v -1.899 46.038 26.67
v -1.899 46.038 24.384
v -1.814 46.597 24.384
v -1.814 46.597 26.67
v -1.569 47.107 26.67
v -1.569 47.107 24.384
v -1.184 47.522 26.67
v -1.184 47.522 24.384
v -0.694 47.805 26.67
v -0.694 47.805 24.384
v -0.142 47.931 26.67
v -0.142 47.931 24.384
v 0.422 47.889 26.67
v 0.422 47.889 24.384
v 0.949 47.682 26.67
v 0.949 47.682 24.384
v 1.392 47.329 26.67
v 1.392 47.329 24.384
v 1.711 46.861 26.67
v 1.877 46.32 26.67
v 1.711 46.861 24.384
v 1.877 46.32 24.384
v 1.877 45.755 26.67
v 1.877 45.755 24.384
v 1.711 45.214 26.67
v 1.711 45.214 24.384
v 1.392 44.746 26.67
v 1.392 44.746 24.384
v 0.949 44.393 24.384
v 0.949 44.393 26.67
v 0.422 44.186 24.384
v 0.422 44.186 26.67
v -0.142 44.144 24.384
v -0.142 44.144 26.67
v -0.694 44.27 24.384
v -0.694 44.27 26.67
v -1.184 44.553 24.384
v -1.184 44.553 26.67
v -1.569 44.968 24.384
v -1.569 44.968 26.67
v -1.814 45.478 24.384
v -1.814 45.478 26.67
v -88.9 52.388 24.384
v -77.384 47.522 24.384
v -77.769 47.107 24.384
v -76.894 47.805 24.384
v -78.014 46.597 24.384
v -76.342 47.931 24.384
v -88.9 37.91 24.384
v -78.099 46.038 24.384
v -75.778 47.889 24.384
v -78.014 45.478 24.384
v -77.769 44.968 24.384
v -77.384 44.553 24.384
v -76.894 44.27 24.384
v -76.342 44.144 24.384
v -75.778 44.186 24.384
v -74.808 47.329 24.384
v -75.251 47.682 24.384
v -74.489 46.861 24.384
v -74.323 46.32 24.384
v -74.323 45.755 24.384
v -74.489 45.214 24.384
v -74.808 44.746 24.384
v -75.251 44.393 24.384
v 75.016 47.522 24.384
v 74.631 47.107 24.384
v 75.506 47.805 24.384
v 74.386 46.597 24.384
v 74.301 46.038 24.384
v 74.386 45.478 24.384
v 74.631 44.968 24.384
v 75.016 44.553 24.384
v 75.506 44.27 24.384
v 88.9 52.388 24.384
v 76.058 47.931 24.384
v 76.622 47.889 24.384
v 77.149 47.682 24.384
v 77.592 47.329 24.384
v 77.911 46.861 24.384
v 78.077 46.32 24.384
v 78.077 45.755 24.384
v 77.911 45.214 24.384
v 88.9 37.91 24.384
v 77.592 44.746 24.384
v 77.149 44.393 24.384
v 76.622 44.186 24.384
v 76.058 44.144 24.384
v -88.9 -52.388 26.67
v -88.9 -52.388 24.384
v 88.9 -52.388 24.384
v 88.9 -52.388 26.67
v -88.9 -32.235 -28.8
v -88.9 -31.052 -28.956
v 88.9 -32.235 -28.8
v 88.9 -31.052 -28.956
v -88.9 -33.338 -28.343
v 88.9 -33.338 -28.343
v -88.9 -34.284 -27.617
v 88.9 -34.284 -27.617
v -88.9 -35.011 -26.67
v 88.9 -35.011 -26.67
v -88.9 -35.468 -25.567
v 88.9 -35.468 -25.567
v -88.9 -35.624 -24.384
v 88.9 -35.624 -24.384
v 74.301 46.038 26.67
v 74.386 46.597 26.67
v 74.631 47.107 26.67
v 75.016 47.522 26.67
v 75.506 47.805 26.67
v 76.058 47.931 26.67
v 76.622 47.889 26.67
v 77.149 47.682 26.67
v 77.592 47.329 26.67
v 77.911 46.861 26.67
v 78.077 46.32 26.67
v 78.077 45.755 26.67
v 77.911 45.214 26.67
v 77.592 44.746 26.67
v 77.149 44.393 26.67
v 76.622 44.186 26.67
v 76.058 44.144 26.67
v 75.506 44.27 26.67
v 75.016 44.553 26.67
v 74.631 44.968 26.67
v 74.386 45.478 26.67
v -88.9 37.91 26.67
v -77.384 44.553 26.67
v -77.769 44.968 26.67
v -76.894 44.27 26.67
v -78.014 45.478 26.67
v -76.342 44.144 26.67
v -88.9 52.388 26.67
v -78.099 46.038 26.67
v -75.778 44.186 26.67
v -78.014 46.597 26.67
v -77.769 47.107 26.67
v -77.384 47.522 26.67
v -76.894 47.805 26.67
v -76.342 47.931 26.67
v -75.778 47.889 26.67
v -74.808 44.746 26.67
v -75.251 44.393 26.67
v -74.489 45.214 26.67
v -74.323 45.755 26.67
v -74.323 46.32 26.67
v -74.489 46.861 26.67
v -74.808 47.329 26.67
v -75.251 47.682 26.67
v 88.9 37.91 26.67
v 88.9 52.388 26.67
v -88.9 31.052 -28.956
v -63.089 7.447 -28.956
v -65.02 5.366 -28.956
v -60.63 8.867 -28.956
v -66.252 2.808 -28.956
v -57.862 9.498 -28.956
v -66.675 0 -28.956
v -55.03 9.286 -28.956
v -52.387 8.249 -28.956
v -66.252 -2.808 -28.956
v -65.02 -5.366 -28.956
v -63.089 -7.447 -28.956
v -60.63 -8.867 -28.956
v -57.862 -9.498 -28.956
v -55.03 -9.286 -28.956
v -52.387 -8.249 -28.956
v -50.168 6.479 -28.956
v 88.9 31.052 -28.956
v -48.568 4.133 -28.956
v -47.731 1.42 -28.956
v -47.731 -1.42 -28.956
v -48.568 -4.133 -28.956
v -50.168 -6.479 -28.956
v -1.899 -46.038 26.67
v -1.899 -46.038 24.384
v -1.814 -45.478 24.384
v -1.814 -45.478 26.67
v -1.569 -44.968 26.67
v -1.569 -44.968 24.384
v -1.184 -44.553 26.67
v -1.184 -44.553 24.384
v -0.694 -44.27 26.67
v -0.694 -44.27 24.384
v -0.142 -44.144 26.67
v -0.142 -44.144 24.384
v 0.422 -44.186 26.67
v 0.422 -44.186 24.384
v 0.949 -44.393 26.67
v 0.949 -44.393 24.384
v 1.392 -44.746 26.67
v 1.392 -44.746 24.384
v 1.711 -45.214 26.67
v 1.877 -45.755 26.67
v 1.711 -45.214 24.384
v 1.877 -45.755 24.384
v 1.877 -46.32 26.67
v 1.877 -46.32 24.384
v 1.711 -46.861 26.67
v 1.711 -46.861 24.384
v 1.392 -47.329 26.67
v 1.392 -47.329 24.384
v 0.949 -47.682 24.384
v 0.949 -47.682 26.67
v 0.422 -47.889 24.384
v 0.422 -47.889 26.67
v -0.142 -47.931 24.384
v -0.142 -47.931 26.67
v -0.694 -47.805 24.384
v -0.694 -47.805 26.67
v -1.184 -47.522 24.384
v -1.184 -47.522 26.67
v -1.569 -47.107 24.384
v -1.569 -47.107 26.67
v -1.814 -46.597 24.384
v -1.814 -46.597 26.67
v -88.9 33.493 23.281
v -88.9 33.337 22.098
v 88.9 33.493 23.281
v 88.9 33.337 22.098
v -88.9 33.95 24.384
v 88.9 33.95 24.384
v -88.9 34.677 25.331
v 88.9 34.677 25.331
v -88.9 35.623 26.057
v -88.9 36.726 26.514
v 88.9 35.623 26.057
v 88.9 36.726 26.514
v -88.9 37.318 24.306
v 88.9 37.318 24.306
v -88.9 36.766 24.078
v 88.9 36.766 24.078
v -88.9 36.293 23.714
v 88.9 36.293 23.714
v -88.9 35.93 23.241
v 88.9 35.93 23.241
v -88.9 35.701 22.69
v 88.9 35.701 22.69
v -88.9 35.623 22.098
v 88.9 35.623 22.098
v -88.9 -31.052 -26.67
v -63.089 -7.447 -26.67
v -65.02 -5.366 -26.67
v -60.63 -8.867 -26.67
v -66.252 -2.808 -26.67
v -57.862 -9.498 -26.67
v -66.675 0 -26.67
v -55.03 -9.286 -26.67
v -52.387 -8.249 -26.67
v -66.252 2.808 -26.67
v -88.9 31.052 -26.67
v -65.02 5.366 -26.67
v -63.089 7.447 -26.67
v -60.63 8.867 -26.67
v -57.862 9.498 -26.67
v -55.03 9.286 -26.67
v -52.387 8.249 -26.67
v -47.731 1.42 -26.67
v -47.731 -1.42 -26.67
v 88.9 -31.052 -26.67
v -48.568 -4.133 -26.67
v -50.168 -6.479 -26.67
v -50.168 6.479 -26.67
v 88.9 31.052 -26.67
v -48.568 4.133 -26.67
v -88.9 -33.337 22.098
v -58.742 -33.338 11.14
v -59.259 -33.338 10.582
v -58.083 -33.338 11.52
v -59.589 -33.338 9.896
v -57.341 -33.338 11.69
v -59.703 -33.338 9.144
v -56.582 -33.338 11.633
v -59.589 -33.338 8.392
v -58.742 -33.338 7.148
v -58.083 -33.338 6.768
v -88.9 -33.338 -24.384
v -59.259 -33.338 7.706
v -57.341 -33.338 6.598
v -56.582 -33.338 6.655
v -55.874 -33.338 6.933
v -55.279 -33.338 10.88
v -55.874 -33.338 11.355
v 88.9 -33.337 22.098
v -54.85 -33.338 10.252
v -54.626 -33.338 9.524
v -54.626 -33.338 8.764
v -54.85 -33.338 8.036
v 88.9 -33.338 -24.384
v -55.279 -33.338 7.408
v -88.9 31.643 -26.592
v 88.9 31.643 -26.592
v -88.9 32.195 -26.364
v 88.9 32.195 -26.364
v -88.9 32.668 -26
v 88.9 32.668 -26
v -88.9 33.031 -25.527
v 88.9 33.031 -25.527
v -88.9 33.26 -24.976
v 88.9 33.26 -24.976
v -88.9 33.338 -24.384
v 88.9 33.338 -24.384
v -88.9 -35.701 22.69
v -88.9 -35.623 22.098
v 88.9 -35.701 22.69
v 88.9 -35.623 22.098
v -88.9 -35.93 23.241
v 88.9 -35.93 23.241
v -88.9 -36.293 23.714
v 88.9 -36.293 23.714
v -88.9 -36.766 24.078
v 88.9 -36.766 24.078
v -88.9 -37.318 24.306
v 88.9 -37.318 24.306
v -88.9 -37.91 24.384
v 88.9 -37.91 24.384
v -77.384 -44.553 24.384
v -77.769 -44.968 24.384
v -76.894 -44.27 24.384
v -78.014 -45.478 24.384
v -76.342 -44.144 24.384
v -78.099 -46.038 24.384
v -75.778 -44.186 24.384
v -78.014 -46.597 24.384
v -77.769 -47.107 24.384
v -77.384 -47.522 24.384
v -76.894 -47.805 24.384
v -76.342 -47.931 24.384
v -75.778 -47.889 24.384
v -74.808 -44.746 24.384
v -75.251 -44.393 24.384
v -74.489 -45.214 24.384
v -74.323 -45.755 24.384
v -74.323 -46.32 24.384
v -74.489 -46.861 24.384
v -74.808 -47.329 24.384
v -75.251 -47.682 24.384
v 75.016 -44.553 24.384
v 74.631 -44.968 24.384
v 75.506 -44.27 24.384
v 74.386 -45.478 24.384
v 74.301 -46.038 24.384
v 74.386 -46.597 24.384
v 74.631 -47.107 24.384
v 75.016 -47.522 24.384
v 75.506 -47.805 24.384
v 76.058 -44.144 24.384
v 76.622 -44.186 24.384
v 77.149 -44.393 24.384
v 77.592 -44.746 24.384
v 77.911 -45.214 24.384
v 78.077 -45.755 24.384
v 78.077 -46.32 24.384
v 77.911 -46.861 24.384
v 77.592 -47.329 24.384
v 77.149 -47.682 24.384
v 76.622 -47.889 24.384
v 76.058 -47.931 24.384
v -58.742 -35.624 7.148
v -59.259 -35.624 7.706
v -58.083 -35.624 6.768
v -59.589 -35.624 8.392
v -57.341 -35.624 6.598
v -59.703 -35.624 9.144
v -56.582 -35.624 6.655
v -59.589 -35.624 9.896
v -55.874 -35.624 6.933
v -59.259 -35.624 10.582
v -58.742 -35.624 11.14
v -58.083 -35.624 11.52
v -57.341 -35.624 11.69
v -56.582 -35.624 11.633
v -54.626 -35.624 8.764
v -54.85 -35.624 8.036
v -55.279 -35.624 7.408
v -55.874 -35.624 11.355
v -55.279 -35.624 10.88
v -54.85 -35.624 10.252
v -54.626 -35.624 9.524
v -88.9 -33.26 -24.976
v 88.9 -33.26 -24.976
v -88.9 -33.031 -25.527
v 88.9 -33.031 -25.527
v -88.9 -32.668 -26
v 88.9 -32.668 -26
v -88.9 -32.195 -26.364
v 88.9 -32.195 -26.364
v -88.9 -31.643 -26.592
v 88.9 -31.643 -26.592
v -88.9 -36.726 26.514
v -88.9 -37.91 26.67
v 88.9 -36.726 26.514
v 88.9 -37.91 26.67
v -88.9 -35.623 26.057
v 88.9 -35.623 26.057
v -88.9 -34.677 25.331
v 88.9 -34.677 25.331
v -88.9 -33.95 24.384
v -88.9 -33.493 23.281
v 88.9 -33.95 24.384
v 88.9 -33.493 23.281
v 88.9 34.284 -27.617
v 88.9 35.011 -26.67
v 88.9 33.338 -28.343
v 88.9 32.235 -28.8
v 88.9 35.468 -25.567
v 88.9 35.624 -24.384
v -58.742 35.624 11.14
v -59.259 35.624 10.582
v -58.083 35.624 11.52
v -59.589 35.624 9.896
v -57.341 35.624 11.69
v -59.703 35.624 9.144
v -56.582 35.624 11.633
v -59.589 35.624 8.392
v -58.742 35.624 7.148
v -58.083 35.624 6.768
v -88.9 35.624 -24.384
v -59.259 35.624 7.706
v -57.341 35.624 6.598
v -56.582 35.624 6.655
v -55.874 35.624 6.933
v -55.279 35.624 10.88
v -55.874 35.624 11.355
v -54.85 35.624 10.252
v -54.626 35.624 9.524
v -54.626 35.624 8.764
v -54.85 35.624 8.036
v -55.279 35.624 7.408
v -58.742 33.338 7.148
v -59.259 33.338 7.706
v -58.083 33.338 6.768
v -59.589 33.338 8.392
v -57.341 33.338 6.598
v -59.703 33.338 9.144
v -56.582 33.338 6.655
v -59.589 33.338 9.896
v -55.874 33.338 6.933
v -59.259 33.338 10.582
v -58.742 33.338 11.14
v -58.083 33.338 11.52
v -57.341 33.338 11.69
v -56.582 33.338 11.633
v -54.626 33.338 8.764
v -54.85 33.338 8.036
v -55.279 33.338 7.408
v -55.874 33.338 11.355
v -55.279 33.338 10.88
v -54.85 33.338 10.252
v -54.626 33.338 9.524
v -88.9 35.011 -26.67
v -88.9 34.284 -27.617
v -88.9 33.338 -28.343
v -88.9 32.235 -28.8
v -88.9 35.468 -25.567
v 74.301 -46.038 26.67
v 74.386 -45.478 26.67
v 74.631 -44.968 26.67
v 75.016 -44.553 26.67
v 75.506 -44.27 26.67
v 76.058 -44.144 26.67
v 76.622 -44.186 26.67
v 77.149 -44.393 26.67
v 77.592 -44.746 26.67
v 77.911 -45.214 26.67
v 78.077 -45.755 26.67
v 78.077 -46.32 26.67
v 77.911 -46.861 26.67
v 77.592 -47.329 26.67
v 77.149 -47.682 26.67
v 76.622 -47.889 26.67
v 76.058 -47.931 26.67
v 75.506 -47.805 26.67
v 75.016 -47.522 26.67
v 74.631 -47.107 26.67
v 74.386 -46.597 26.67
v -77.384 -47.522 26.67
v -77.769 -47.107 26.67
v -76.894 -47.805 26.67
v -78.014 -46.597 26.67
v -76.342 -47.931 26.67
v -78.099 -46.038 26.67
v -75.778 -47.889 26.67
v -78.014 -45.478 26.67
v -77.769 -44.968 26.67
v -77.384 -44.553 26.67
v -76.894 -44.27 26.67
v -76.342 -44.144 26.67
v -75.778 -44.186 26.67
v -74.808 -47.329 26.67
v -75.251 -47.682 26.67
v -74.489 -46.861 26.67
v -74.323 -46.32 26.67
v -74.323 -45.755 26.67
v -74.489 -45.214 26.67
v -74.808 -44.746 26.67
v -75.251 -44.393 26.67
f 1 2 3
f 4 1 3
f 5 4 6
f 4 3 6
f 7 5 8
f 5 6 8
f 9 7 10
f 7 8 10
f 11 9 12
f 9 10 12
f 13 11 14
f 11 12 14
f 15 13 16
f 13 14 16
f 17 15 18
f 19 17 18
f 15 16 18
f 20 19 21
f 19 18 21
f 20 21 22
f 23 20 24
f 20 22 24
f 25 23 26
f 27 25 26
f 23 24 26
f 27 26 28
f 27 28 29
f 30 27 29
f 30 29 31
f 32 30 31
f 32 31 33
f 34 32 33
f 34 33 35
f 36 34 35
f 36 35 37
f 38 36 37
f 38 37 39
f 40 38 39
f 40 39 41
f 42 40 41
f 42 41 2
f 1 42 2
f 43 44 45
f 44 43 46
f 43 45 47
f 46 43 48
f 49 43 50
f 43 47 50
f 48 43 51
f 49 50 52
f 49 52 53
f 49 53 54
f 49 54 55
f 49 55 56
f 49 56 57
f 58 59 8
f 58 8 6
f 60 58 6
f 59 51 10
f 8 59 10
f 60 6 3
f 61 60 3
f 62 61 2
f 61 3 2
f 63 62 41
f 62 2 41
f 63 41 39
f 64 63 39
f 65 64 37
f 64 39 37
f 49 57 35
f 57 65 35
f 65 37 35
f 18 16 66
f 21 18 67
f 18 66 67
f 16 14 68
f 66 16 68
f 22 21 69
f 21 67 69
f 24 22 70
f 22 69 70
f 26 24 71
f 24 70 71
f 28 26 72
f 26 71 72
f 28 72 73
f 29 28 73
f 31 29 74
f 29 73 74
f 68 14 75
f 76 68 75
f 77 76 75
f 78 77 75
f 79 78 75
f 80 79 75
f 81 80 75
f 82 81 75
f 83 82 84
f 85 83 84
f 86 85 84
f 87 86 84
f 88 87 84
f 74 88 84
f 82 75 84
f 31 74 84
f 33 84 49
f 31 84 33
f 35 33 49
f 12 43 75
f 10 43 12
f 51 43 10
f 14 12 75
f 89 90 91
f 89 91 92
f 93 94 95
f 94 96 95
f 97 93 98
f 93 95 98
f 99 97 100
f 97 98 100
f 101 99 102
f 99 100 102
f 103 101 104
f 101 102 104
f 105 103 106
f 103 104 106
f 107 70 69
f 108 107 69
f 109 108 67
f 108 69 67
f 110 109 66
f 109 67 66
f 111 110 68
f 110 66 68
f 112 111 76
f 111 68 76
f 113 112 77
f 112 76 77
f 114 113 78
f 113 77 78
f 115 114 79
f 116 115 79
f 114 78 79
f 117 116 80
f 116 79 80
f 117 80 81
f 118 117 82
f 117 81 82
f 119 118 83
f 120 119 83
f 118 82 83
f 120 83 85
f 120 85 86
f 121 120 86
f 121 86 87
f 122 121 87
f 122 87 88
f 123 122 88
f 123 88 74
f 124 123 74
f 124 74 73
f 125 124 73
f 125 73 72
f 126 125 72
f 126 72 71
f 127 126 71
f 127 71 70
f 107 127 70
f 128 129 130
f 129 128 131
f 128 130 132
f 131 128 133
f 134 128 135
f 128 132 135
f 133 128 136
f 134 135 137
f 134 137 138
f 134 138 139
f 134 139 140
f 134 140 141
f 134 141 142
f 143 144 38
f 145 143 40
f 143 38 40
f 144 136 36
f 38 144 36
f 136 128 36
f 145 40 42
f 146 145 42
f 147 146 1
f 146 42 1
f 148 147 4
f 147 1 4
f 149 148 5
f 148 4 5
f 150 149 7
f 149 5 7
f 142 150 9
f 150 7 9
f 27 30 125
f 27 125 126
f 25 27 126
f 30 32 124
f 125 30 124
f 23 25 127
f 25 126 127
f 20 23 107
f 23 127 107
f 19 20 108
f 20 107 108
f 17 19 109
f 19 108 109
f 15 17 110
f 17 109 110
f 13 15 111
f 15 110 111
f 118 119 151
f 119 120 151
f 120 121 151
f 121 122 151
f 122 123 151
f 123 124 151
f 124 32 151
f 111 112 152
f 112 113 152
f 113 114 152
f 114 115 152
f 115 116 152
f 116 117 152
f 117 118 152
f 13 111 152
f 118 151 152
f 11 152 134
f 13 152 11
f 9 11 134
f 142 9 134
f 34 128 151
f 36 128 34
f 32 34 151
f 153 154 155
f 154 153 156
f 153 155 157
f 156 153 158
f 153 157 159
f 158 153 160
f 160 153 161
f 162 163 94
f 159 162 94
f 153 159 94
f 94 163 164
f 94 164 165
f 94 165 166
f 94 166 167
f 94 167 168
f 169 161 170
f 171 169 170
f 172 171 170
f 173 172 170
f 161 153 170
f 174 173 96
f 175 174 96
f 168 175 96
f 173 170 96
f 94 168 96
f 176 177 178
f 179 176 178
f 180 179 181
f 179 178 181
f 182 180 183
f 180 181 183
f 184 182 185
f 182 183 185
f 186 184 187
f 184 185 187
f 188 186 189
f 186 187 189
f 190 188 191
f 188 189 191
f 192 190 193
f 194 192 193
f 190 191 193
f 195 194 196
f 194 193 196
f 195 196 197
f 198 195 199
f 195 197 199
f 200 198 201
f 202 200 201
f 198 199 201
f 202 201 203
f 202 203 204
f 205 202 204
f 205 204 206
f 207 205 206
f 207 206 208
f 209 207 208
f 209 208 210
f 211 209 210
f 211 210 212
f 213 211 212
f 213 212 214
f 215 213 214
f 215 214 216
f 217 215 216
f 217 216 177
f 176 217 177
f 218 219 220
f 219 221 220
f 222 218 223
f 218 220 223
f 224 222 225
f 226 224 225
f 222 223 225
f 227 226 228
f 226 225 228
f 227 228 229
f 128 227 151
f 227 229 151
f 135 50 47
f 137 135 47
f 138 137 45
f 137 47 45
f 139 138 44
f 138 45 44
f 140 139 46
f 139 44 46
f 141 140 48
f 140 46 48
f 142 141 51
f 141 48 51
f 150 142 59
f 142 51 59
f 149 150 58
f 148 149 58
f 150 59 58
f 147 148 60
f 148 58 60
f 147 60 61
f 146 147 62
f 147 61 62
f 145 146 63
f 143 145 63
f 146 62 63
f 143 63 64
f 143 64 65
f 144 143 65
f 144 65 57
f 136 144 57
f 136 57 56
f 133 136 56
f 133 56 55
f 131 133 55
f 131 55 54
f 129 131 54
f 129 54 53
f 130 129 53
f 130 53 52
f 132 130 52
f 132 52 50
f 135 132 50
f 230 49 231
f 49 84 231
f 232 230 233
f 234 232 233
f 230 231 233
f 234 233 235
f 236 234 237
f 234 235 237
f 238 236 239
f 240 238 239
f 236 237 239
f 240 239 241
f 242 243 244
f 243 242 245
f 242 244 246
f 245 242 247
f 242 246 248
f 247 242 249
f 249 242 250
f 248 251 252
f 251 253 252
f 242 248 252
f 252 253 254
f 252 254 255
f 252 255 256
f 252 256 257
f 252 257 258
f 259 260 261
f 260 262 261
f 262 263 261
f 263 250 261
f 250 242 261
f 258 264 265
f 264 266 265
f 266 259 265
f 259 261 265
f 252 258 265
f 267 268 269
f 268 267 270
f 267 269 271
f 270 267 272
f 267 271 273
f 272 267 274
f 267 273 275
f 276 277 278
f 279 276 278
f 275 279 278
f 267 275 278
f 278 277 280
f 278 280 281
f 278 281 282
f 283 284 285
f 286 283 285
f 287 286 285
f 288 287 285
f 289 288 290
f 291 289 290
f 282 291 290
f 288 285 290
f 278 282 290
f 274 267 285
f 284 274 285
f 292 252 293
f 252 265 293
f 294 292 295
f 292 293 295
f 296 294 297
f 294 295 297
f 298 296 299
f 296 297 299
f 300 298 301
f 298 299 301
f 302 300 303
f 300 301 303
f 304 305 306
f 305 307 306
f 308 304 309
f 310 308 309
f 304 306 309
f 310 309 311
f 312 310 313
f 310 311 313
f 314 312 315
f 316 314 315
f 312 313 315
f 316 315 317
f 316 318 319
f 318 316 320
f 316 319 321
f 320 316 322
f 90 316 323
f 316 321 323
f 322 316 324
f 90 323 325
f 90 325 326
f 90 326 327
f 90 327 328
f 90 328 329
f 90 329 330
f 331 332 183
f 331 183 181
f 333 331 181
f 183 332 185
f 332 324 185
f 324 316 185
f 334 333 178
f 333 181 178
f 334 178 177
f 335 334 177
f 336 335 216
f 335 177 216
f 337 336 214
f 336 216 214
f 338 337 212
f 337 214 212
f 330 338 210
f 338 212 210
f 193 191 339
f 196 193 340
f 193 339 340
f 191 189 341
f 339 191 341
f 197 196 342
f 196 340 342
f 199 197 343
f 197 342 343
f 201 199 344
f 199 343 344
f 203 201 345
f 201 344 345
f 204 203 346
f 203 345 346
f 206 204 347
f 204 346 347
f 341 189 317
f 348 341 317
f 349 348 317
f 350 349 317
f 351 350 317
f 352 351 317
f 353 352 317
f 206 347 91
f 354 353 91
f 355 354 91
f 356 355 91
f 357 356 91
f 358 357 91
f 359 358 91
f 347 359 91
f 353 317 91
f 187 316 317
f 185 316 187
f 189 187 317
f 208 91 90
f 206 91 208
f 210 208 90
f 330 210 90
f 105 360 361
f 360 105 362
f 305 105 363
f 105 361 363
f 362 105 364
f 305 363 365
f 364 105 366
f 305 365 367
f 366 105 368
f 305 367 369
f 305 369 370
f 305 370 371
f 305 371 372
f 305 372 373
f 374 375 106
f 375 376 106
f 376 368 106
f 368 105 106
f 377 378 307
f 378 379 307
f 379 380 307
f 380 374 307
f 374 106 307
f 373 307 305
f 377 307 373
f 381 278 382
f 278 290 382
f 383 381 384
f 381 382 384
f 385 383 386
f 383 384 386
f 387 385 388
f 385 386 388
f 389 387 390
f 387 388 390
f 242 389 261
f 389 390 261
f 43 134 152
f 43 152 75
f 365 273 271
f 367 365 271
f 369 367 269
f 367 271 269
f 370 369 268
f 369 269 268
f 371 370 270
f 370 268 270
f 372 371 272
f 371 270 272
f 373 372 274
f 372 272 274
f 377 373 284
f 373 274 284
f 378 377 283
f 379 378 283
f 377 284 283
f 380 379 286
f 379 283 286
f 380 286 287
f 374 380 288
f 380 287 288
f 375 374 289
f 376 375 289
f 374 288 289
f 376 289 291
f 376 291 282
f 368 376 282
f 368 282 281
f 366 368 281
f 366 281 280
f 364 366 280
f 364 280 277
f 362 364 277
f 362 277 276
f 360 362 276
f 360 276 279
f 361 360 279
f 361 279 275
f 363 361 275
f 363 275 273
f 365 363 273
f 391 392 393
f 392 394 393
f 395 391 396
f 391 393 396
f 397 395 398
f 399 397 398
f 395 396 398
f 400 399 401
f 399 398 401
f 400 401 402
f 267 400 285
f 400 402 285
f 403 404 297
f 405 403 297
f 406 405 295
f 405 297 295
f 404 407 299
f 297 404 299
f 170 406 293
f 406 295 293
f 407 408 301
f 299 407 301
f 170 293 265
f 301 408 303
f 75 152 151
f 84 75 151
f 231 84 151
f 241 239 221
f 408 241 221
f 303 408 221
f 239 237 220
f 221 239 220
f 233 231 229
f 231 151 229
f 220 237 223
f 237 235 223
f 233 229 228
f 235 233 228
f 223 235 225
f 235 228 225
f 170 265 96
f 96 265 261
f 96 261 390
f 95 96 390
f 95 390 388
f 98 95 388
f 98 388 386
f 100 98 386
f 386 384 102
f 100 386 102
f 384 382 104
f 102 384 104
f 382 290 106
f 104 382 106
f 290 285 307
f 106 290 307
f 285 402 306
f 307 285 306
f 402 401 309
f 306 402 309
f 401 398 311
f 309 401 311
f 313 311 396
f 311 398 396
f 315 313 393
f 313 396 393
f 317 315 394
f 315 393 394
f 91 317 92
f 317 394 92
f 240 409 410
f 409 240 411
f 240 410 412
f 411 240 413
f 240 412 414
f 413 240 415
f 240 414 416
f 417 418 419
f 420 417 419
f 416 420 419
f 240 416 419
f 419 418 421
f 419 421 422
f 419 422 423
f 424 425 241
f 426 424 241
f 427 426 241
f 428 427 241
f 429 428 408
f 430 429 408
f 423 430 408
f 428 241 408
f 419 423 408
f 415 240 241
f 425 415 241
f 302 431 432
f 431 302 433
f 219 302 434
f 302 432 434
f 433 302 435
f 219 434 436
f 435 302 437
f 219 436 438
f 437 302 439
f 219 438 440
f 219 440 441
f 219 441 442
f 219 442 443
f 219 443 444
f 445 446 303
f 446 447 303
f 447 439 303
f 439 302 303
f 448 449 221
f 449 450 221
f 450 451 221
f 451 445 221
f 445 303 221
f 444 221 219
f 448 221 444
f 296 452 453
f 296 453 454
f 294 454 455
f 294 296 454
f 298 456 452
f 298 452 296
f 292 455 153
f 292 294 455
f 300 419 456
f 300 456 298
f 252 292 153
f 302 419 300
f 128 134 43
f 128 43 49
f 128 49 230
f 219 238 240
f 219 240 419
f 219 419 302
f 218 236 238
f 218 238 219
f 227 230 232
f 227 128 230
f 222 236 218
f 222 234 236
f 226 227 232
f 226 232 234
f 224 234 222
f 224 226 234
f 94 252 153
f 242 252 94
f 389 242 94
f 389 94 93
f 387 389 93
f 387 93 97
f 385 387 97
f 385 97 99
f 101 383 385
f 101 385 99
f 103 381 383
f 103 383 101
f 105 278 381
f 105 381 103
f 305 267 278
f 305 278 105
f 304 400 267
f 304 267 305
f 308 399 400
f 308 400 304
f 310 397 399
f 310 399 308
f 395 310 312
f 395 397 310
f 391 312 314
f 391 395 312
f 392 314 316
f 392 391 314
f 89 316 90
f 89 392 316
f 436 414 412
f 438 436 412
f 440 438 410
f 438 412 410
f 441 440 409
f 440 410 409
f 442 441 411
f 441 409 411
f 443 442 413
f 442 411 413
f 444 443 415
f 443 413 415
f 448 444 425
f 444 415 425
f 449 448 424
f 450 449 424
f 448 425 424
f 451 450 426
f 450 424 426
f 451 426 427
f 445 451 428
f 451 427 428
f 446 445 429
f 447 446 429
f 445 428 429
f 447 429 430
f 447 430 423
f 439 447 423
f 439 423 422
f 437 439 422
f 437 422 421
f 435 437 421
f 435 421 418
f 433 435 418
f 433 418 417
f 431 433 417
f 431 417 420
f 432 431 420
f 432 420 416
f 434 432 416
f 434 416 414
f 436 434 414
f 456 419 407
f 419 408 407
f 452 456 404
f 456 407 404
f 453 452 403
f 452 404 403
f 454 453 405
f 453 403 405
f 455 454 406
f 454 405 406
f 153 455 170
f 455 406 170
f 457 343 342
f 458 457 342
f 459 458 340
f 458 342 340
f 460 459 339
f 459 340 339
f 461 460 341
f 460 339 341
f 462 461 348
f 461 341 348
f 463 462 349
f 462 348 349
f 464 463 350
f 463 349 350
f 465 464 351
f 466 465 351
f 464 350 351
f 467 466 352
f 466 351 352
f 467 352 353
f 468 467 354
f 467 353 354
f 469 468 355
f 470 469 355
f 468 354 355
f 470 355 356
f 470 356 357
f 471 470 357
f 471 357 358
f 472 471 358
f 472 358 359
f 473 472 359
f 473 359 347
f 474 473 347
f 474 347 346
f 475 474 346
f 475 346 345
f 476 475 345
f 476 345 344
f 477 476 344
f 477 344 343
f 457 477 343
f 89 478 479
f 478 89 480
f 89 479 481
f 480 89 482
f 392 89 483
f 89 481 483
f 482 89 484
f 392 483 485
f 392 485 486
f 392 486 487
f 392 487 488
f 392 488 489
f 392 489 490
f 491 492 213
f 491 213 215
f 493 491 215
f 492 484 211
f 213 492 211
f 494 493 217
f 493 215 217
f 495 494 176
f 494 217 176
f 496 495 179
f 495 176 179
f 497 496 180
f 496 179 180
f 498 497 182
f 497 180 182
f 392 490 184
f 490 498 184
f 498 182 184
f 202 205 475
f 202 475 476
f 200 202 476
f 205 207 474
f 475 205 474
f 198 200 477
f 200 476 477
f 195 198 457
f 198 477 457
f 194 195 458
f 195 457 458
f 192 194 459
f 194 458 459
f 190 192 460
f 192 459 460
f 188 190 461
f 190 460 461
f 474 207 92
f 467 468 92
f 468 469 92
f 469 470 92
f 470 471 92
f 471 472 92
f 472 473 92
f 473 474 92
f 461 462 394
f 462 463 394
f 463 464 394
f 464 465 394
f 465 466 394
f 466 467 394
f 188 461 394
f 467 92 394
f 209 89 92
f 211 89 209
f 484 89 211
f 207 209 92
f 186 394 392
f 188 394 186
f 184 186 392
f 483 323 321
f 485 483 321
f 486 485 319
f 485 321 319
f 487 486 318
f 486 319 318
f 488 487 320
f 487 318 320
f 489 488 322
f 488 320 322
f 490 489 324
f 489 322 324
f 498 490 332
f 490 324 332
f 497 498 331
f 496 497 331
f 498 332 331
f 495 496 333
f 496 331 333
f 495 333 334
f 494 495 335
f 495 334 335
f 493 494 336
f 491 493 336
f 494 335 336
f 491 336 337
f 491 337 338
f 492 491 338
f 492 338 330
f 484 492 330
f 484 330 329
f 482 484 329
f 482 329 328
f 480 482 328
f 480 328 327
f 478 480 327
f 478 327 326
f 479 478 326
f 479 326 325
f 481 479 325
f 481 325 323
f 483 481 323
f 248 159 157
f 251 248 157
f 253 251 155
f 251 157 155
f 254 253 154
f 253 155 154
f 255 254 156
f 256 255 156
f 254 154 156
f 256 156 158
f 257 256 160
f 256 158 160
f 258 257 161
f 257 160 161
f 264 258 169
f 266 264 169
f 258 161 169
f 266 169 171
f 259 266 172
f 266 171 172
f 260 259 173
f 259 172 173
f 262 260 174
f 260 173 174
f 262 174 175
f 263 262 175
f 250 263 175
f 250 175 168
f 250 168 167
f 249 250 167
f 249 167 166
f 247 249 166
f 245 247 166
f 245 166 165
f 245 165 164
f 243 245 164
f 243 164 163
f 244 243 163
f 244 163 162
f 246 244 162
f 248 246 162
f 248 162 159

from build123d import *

# Parameters (mm, degrees)
BASE_FLANGE1_DEPTH           = 88.9
F_25_0_1495_DIAMETER_HOLE1_D = 3.7973
F_7_0_201_DIAMETER_HOLE1_D   = 5.1054
F_3_4_0_75_DIAMETER_HOLE1_D  = 19.05


# Sheet-metal steps are written as plain solids
with BuildPart() as part:
    # Sketch1 → Base-Flange1 (new, symmetric)
    with BuildSketch(Plane.YZ):
        with BuildLine():
            Line((-52.3875, 26.67), (-37.9095, 26.67))
            ThreePointArc((-37.9095, 26.67), (-34.676607796, 25.330892204), (-33.3375, 22.098))
            Line((-33.3375, 22.098), (-33.3375, -24.384))
            ThreePointArc((-33.3375, -24.384), (-32.667946102, -26.000446102), (-31.0515, -26.67))
            Line((-31.0515, -26.67), (31.0515, -26.67))
            ThreePointArc((31.0515, -26.67), (32.667946102, -26.000446102), (33.3375, -24.384))
            Line((33.3375, -24.384), (33.3375, 22.098))
            ThreePointArc((33.3375, 22.098), (34.676607796, 25.330892204), (37.9095, 26.67))
            Line((37.9095, 26.67), (52.3875, 26.67))
            Line((52.3875, 26.67), (52.3875, 24.384))
            Line((52.3875, 24.384), (37.9095, 24.384))
            ThreePointArc((37.9095, 24.384), (36.293053898, 23.714446102), (35.6235, 22.098))
            Line((35.6235, 22.098), (35.6235, -24.384))
            ThreePointArc((35.6235, -24.384), (34.284392204, -27.616892204), (31.0515, -28.956))
            Line((31.0515, -28.956), (-31.0515, -28.956))
            ThreePointArc((-31.0515, -28.956), (-34.284392204, -27.616892204), (-35.6235, -24.384))
            Line((-35.6235, -24.384), (-35.6235, 22.098))
            ThreePointArc((-35.6235, 22.098), (-36.293053898, 23.714446102), (-37.9095, 24.384))
            Line((-37.9095, 24.384), (-52.3875, 24.384))
            Line((-52.3875, 24.384), (-52.3875, 26.67))
        make_face()
    extrude(amount=BASE_FLANGE1_DEPTH, both=True)

    # #25 (0.1495) Diameter Hole1 (through all)
    with Locations(Plane.XY.offset(26.67)):
        with Locations((-76.2, 46.0375), (0, 46.0375), (76.2, 46.0375), (76.2, -46.0375), (0, -46.0375), (-76.2, -46.0375)):
            Hole(F_25_0_1495_DIAMETER_HOLE1_D / 2)

    # #7 (0.201) Diameter Hole1 (through all)
    with Locations(Plane.XZ.offset(35.6235)):
        with Locations((-57.15, 9.144)):
            Hole(F_7_0_201_DIAMETER_HOLE1_D / 2)

    # 3/4 (0.75) Diameter Hole1 (through all)
    with Locations(Plane.XY.offset(-26.67)):
        with Locations((-57.15, 0)):
            Hole(F_3_4_0_75_DIAMETER_HOLE1_D / 2)


solid = part.part
